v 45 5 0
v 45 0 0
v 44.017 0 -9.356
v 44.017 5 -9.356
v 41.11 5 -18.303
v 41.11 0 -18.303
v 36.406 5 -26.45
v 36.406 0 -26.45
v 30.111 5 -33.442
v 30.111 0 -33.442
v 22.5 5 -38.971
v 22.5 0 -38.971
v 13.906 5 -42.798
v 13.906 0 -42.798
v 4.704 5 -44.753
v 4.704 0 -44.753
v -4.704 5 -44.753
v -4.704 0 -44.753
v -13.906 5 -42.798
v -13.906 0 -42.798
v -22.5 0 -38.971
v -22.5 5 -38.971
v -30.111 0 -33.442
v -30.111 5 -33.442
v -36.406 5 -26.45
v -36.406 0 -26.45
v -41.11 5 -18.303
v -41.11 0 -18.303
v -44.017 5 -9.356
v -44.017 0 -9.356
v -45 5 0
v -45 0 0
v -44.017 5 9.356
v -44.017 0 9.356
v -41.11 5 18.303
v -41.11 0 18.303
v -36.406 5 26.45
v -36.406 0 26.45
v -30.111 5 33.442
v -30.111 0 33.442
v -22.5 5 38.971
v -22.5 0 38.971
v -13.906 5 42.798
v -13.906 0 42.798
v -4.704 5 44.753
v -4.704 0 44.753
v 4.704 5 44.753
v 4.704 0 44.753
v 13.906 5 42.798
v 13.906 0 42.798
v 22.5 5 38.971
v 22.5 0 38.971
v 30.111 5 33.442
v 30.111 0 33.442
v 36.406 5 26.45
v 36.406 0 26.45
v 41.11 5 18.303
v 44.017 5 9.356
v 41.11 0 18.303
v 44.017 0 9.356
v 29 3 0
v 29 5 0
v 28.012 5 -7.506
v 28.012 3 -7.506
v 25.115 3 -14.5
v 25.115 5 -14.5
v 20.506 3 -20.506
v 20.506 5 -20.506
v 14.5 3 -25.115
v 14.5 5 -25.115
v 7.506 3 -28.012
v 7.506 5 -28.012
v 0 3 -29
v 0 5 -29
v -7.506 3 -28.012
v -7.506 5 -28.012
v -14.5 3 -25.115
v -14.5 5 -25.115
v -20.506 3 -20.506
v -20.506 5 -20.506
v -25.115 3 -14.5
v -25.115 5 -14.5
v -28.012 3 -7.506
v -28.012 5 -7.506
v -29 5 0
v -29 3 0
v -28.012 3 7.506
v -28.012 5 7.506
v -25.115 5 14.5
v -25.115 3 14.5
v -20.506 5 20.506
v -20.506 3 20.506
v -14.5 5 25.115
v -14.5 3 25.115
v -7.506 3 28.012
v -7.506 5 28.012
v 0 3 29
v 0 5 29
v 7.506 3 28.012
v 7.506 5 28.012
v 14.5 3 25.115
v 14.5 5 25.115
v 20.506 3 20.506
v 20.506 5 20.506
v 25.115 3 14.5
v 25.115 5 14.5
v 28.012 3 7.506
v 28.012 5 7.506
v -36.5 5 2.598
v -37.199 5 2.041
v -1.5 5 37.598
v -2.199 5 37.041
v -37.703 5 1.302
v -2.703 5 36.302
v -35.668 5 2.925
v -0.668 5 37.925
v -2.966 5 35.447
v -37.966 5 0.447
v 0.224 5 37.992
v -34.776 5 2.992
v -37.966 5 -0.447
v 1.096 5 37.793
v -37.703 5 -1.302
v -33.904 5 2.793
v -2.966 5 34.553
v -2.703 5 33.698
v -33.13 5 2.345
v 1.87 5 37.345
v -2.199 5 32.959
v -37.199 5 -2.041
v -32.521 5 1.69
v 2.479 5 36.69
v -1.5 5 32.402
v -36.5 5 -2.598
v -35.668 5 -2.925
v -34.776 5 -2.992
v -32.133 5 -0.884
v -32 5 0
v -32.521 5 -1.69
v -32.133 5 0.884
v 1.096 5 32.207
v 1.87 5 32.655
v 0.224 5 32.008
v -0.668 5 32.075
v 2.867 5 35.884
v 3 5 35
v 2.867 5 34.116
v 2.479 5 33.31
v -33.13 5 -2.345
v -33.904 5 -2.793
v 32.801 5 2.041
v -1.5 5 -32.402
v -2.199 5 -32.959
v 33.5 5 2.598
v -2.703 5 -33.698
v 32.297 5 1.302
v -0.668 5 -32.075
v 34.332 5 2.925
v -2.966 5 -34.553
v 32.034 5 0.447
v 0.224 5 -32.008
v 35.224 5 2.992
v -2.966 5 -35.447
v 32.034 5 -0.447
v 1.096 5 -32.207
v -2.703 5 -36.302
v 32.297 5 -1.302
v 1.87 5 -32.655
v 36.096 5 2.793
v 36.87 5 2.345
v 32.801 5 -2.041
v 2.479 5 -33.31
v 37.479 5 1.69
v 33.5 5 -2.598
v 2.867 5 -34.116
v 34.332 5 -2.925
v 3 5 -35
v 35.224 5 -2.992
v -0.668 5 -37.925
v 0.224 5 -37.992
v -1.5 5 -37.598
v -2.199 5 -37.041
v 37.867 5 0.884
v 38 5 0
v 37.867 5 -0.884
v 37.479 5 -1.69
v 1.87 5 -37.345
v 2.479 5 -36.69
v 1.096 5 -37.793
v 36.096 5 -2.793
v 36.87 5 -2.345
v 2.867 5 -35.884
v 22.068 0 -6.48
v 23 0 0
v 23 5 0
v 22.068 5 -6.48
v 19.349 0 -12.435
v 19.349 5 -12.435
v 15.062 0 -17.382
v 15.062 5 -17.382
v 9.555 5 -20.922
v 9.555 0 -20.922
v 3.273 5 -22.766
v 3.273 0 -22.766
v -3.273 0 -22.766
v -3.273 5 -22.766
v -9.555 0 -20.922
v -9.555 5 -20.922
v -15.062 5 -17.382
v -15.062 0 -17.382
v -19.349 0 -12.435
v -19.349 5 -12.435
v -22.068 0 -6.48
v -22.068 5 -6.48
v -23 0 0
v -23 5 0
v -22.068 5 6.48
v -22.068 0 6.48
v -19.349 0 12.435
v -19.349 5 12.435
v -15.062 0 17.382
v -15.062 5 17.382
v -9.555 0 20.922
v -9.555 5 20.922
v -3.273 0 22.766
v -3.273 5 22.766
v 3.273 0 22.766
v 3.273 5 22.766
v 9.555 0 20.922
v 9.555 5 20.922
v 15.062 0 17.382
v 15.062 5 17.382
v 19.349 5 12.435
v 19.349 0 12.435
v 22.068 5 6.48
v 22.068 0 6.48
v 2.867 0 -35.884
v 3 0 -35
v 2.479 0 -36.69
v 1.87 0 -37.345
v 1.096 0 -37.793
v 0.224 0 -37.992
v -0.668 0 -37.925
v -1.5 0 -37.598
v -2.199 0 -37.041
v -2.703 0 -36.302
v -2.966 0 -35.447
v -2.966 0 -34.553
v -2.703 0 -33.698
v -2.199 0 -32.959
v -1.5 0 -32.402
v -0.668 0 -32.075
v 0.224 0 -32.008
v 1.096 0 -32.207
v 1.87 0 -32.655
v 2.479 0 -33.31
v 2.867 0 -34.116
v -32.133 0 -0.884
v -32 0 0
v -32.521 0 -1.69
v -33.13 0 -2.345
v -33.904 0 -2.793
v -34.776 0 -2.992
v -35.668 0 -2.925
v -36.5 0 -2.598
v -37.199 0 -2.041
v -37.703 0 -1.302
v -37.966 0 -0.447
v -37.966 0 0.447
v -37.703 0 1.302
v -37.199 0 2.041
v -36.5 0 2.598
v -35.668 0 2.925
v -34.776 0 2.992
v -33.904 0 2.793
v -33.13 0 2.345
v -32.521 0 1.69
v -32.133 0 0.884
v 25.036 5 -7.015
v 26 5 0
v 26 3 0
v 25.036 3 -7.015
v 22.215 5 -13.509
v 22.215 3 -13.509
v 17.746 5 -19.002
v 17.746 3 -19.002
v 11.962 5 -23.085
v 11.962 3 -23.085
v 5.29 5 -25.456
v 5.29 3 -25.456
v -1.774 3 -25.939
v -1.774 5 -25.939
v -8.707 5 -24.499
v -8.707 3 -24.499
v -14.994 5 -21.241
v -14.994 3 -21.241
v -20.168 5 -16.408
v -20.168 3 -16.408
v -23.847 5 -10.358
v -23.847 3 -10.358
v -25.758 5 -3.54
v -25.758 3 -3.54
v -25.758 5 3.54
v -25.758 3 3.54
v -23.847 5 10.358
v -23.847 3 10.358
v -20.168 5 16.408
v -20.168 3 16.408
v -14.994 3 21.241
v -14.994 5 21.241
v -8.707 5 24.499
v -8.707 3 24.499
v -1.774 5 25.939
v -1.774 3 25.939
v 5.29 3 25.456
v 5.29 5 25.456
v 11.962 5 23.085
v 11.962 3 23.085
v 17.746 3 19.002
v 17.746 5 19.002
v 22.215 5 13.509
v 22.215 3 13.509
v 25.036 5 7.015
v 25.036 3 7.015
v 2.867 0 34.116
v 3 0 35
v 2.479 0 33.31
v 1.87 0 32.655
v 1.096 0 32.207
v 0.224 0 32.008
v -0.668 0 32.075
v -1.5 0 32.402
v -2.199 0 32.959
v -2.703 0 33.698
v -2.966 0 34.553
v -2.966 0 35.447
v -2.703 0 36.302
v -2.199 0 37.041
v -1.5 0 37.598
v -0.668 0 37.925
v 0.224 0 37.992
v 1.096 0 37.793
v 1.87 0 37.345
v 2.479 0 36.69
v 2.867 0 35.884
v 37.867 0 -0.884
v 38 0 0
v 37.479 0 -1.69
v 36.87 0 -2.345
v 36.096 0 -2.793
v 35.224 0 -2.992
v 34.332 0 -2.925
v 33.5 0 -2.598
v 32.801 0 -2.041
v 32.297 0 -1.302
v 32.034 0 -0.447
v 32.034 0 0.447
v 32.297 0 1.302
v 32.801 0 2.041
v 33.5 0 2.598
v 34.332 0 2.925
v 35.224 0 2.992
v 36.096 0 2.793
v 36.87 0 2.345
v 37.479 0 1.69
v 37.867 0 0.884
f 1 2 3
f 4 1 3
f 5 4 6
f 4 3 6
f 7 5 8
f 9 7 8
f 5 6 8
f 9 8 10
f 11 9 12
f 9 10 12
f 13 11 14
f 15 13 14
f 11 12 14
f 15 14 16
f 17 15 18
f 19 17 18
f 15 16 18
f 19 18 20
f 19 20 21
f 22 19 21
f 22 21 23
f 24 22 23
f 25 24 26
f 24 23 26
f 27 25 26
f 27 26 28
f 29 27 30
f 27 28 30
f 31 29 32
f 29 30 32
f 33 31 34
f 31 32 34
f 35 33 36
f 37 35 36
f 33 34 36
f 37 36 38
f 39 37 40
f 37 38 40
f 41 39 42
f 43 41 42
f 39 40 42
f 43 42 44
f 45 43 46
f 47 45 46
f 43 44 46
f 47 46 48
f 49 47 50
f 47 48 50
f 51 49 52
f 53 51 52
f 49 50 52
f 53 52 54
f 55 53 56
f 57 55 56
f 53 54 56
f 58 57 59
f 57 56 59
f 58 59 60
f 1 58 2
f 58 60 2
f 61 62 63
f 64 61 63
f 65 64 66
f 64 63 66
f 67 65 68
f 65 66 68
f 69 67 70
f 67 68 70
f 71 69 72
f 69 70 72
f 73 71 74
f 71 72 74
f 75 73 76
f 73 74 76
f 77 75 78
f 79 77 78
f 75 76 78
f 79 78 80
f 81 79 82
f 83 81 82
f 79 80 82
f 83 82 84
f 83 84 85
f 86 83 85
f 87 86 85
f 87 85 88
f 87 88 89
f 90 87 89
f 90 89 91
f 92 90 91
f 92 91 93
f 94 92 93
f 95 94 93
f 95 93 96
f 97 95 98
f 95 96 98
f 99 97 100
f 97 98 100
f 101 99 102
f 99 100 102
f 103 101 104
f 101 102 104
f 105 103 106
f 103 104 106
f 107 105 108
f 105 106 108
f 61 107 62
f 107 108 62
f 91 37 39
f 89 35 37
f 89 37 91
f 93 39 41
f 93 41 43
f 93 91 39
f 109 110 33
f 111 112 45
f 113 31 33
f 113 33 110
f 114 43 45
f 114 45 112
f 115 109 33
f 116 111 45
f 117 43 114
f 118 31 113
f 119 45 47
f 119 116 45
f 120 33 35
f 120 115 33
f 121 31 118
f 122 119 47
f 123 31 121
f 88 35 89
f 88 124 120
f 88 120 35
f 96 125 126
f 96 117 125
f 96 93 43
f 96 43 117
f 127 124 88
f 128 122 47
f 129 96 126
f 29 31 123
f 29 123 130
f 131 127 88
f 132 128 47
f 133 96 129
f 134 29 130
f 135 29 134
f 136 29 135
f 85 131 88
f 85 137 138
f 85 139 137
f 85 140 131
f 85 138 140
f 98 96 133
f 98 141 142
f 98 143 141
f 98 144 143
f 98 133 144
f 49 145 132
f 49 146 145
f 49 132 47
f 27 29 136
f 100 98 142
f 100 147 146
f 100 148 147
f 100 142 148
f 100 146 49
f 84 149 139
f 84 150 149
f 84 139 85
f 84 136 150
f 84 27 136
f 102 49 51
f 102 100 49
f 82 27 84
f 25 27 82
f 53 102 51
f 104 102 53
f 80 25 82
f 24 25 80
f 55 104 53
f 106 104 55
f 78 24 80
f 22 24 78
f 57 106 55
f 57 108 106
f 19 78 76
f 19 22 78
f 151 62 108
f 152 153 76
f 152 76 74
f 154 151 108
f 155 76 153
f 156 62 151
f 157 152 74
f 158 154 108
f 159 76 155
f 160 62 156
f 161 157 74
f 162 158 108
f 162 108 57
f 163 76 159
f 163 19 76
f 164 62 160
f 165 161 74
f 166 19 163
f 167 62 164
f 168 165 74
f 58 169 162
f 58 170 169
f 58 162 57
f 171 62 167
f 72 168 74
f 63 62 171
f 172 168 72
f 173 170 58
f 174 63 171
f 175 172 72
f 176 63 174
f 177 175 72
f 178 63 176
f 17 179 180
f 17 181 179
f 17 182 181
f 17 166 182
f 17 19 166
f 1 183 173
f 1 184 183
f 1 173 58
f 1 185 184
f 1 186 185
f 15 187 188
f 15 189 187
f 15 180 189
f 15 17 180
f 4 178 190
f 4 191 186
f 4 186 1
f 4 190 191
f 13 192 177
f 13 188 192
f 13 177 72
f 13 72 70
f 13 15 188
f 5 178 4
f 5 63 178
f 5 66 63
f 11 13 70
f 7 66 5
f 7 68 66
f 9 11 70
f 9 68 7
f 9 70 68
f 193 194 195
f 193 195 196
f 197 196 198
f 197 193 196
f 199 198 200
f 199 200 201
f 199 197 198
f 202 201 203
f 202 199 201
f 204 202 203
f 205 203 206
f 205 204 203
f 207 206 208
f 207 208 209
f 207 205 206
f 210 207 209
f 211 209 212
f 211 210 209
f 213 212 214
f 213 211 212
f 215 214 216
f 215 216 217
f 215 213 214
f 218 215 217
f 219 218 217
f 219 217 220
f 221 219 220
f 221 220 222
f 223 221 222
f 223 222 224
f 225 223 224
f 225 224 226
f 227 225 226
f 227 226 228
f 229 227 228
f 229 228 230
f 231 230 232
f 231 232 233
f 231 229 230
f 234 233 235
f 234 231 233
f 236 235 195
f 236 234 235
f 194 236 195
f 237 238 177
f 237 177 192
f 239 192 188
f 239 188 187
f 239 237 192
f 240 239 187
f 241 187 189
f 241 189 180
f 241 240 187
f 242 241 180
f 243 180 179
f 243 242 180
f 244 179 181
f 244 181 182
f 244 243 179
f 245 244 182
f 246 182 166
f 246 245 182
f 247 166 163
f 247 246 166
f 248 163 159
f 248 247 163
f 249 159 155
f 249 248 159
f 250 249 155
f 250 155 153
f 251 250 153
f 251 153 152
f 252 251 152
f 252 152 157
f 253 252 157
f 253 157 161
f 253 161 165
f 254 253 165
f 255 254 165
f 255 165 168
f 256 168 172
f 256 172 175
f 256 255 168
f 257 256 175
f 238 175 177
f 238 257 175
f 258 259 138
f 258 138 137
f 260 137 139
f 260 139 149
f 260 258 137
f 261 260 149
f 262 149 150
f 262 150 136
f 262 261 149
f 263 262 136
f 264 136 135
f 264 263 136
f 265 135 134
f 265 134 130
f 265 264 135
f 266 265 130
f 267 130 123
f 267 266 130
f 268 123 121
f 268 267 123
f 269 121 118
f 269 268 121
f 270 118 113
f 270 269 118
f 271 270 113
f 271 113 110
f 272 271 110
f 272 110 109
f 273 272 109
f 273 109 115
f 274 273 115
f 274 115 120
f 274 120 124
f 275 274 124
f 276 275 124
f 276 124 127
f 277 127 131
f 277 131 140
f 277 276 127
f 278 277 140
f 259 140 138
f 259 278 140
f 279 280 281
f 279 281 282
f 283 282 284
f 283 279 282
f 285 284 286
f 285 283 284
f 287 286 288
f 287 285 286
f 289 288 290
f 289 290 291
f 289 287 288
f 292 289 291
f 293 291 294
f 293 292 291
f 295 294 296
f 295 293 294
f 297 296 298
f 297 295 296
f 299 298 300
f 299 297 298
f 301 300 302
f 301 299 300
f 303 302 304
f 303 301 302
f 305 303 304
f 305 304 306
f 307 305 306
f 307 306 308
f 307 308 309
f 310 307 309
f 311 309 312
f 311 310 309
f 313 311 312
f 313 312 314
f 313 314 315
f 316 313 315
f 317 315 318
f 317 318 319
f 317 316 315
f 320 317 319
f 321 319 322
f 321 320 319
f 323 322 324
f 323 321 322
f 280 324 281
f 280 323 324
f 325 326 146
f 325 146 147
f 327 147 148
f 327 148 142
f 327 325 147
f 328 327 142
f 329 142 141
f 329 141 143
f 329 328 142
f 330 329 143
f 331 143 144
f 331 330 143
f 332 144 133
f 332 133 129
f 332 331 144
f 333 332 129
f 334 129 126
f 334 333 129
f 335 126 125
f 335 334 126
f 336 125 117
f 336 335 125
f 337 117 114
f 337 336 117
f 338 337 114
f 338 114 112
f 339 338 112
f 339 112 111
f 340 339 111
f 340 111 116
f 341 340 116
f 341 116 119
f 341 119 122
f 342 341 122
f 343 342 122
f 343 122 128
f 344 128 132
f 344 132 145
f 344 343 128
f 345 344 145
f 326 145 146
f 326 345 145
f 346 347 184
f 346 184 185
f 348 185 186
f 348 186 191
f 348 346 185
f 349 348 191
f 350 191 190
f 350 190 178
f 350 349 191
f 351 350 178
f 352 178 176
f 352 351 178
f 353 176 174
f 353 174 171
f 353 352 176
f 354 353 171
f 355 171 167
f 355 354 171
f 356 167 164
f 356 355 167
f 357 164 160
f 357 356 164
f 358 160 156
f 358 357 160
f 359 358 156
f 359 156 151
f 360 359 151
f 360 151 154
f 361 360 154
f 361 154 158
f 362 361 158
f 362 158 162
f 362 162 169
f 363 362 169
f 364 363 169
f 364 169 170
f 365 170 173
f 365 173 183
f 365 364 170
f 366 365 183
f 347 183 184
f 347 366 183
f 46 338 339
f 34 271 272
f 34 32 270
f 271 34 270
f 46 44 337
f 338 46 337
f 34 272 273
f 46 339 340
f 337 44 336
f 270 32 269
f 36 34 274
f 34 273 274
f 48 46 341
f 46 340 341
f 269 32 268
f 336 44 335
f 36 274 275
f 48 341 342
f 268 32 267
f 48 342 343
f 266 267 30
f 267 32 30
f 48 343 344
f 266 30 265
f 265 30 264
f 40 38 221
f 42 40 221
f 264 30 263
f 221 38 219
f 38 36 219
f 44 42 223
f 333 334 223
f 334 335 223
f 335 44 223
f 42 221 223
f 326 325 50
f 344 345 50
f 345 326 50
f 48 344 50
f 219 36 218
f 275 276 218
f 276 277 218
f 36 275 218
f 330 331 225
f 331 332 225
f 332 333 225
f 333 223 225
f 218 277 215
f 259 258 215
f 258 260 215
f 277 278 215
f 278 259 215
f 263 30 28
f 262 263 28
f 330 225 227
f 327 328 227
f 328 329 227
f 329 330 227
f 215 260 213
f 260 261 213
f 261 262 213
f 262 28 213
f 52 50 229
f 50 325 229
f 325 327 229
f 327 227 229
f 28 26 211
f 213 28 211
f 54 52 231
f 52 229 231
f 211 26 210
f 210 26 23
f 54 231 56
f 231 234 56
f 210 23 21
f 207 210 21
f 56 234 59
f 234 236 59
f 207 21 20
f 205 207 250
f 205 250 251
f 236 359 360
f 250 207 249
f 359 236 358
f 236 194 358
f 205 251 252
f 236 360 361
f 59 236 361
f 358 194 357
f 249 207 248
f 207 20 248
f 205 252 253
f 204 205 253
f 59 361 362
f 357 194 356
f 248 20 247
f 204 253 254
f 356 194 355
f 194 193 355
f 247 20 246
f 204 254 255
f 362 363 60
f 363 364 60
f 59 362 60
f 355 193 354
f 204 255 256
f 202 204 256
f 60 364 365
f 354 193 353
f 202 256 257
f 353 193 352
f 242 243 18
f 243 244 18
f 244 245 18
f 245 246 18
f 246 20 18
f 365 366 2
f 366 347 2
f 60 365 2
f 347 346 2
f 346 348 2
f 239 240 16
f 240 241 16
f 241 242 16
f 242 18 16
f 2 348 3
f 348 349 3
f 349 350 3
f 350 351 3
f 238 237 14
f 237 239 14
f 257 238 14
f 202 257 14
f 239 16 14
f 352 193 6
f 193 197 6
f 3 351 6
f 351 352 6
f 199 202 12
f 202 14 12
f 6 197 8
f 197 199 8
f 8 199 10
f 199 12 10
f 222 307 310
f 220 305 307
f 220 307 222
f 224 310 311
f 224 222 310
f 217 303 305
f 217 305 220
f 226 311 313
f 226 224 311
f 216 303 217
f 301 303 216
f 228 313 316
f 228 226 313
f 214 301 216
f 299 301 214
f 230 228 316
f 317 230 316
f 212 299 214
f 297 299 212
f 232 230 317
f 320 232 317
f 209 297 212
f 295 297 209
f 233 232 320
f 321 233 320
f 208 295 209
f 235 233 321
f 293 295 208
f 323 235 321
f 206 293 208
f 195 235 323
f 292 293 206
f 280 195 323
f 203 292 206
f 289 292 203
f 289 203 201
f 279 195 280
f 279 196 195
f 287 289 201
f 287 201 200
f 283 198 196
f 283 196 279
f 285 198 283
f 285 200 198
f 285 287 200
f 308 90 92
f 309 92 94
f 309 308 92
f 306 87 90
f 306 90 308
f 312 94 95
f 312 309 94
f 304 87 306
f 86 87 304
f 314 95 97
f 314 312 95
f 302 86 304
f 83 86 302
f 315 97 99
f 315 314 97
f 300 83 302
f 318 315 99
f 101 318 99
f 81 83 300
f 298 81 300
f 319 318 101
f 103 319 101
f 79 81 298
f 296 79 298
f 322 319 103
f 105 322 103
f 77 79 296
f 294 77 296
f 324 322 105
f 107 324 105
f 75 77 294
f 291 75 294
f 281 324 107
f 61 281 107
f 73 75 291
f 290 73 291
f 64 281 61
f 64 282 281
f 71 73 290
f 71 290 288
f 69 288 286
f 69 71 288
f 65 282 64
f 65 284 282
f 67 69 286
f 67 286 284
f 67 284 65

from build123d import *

# Parameters (mm, degrees)
SKETCH_1_R         = 45
SKETCH_1_R_2       = 3
SKETCH_1_R_3       = 23
EXTRUDE_3_DEPTH    = 5
SKETCH1_R          = 29
SKETCH1_R_2        = 26
CUT_EXTRUDE1_DEPTH = 2


with BuildPart() as part:
    # 草圖1 → 填料-伸長3 (new body)
    with BuildSketch(Plane(origin=(0, 0, 0), x_dir=(1, 0, 0), z_dir=(0, 1, 0))):
        Circle(SKETCH_1_R)
        with Locations((-35, 0)):
            Circle(SKETCH_1_R_2, mode=Mode.SUBTRACT)
        with Locations((35, 0)):
            Circle(SKETCH_1_R_2, mode=Mode.SUBTRACT)
        with Locations((0, -35)):
            Circle(SKETCH_1_R_2, mode=Mode.SUBTRACT)
        with Locations((0, 35)):
            Circle(SKETCH_1_R_2, mode=Mode.SUBTRACT)
        Circle(SKETCH_1_R_3, mode=Mode.SUBTRACT)
    extrude(amount=EXTRUDE_3_DEPTH)

    # Sketch1 → Cut-Extrude1 (cut)
    with BuildSketch(Plane(origin=(0, 5, 0), x_dir=(1, 0, 0), z_dir=(0, 1, 0))):
        Circle(SKETCH1_R)
        Circle(SKETCH1_R_2, mode=Mode.SUBTRACT)
    extrude(amount=-CUT_EXTRUDE1_DEPTH, mode=Mode.SUBTRACT)


solid = part.part
